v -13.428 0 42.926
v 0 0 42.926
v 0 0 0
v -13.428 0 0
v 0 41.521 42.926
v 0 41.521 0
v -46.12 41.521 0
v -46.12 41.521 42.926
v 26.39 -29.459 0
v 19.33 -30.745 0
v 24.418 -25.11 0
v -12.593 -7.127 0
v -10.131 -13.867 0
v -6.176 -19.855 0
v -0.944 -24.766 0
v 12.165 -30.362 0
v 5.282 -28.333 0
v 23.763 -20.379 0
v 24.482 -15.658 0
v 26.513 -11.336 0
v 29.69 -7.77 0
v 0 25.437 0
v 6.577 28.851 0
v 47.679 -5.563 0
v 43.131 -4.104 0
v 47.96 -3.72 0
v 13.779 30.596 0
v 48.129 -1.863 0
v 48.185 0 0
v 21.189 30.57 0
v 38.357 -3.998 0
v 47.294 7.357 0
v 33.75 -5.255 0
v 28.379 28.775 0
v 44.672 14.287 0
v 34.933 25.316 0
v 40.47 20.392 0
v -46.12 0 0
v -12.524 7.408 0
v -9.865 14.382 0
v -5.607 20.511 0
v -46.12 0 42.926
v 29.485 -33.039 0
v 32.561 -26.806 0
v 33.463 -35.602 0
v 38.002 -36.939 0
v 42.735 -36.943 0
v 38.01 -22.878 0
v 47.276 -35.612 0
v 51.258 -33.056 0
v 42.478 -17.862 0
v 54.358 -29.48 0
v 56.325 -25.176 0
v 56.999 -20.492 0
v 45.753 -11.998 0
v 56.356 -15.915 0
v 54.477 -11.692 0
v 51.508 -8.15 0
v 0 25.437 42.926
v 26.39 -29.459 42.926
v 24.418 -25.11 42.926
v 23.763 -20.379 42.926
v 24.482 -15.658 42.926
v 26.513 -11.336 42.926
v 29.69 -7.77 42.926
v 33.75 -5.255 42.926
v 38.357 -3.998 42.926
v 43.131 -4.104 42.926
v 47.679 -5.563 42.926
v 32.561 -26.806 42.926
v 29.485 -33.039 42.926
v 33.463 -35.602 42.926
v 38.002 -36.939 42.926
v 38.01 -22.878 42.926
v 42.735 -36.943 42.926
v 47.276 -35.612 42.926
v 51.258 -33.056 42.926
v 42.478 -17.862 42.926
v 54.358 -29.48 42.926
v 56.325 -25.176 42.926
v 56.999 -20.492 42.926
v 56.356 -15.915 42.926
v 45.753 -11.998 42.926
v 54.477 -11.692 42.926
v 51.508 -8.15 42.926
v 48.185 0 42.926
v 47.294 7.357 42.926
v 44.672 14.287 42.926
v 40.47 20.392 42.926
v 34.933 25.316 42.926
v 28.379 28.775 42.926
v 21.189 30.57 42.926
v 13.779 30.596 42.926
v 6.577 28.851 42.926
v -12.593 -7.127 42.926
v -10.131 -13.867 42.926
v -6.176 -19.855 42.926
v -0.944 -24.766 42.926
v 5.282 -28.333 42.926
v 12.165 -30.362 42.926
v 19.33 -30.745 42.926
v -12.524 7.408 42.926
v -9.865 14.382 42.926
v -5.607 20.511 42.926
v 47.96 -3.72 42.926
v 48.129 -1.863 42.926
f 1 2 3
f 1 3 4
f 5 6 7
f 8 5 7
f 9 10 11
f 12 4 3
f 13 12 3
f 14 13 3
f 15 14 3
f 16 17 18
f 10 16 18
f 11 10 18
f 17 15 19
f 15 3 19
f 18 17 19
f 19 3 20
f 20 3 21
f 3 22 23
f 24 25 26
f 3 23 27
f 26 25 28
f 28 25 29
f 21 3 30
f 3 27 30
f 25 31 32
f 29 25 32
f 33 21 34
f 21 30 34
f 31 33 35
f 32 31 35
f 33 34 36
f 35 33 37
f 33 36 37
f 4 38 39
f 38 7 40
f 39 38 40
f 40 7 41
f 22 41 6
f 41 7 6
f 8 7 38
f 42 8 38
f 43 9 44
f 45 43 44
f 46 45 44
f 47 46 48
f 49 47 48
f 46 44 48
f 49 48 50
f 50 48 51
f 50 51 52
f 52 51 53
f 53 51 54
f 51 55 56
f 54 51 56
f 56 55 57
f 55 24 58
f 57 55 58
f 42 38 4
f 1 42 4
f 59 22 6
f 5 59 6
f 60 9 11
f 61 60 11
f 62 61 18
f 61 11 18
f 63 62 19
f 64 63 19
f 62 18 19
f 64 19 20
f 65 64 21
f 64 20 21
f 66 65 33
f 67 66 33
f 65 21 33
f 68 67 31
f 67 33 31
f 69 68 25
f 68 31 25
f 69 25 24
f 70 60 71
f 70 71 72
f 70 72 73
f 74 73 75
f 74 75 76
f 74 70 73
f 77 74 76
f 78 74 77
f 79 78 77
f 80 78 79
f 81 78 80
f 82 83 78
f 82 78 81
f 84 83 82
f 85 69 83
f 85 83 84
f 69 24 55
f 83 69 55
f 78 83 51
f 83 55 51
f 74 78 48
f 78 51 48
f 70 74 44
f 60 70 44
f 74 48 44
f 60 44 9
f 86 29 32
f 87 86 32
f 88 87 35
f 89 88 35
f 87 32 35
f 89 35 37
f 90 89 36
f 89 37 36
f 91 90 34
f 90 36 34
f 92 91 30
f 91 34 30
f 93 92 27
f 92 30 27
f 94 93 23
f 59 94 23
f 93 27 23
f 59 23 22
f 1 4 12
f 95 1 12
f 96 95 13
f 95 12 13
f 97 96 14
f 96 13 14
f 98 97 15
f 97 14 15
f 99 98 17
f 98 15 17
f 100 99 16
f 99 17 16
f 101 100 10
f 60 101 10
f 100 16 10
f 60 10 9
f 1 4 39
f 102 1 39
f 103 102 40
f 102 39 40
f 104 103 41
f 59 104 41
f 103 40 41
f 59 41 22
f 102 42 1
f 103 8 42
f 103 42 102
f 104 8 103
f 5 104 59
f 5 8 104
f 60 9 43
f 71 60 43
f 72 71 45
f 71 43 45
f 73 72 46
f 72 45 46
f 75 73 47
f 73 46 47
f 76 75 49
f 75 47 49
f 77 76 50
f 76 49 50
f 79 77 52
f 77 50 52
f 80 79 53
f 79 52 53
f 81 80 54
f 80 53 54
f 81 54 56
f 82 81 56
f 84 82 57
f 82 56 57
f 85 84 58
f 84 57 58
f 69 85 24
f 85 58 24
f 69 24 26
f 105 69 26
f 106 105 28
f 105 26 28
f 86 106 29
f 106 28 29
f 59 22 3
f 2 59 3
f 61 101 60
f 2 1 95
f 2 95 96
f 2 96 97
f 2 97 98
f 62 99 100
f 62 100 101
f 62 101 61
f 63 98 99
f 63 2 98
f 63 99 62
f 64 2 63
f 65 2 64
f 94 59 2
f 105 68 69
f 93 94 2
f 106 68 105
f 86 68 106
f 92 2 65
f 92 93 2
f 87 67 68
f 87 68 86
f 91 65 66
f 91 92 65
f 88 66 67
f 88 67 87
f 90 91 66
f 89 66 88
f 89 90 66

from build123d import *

# Parameters (mm, degrees)
F1_DEPTH = 42.926


with BuildPart() as f1:
    # F0 (on Top) → F1 (new body)
    with BuildSketch(Plane.XY):
        with BuildLine():
            Line((-46.1203753948, 0), (-13.4282783921, 0))
            ThreePointArc((-13.4282783921, 0), (-9.8651513224, 14.3819342766), (0, 25.437009918))
            Line((0, 25.437009918), (0, 41.5209047496))
            Line((0, 41.5209047496), (-46.1203753948, 41.5209047496))
            Line((-46.1203753948, 41.5209047496), (-46.1203753948, 0))
        make_face()
    extrude(amount=F1_DEPTH)


with BuildPart() as f1b:
    # F0 (on Top) → F1, piece 2 (new body)
    with BuildSketch(Plane.XY):
        with BuildLine():
            ThreePointArc((47.6786313345, -5.5625600968), (40.3809064348, -20.492228507), (26.3899580388, -29.4591204174))
            ThreePointArc((26.3899580388, -29.4591204174), (45.052779202, -36.4398111576), (56.9987218011, -20.492228507))
            ThreePointArc((56.9987218011, -20.492228507), (54.477431406, -11.6922415021), (47.6786313345, -5.5625600968))
        make_face()
    extrude(amount=F1_DEPTH)


with BuildPart() as f1c:
    # F0 (on Top) → F1, piece 3 (new body)
    with BuildSketch(Plane.XY):
        with BuildLine():
            Line((0, 25.437009918), (0, 0))
            Line((0, 0), (-13.4282783921, 0))
            ThreePointArc((-13.4282783921, 0), (-0.9441929, -24.7655593932), (26.3899580388, -29.4591204174))
            ThreePointArc((26.3899580388, -29.4591204174), (27.9727958219, -9.4382437699), (47.6786313345, -5.5625600968))
            ThreePointArc((47.6786313345, -5.5625600968), (48.0581399248, -2.792779751), (48.1849910076, 0))
            ThreePointArc((48.1849910076, 0), (31.7602905844, 27.2435076301), (0, 25.437009918))
        make_face()
    extrude(amount=F1_DEPTH)


solid = Compound([f1.part, f1b.part, f1c.part])
